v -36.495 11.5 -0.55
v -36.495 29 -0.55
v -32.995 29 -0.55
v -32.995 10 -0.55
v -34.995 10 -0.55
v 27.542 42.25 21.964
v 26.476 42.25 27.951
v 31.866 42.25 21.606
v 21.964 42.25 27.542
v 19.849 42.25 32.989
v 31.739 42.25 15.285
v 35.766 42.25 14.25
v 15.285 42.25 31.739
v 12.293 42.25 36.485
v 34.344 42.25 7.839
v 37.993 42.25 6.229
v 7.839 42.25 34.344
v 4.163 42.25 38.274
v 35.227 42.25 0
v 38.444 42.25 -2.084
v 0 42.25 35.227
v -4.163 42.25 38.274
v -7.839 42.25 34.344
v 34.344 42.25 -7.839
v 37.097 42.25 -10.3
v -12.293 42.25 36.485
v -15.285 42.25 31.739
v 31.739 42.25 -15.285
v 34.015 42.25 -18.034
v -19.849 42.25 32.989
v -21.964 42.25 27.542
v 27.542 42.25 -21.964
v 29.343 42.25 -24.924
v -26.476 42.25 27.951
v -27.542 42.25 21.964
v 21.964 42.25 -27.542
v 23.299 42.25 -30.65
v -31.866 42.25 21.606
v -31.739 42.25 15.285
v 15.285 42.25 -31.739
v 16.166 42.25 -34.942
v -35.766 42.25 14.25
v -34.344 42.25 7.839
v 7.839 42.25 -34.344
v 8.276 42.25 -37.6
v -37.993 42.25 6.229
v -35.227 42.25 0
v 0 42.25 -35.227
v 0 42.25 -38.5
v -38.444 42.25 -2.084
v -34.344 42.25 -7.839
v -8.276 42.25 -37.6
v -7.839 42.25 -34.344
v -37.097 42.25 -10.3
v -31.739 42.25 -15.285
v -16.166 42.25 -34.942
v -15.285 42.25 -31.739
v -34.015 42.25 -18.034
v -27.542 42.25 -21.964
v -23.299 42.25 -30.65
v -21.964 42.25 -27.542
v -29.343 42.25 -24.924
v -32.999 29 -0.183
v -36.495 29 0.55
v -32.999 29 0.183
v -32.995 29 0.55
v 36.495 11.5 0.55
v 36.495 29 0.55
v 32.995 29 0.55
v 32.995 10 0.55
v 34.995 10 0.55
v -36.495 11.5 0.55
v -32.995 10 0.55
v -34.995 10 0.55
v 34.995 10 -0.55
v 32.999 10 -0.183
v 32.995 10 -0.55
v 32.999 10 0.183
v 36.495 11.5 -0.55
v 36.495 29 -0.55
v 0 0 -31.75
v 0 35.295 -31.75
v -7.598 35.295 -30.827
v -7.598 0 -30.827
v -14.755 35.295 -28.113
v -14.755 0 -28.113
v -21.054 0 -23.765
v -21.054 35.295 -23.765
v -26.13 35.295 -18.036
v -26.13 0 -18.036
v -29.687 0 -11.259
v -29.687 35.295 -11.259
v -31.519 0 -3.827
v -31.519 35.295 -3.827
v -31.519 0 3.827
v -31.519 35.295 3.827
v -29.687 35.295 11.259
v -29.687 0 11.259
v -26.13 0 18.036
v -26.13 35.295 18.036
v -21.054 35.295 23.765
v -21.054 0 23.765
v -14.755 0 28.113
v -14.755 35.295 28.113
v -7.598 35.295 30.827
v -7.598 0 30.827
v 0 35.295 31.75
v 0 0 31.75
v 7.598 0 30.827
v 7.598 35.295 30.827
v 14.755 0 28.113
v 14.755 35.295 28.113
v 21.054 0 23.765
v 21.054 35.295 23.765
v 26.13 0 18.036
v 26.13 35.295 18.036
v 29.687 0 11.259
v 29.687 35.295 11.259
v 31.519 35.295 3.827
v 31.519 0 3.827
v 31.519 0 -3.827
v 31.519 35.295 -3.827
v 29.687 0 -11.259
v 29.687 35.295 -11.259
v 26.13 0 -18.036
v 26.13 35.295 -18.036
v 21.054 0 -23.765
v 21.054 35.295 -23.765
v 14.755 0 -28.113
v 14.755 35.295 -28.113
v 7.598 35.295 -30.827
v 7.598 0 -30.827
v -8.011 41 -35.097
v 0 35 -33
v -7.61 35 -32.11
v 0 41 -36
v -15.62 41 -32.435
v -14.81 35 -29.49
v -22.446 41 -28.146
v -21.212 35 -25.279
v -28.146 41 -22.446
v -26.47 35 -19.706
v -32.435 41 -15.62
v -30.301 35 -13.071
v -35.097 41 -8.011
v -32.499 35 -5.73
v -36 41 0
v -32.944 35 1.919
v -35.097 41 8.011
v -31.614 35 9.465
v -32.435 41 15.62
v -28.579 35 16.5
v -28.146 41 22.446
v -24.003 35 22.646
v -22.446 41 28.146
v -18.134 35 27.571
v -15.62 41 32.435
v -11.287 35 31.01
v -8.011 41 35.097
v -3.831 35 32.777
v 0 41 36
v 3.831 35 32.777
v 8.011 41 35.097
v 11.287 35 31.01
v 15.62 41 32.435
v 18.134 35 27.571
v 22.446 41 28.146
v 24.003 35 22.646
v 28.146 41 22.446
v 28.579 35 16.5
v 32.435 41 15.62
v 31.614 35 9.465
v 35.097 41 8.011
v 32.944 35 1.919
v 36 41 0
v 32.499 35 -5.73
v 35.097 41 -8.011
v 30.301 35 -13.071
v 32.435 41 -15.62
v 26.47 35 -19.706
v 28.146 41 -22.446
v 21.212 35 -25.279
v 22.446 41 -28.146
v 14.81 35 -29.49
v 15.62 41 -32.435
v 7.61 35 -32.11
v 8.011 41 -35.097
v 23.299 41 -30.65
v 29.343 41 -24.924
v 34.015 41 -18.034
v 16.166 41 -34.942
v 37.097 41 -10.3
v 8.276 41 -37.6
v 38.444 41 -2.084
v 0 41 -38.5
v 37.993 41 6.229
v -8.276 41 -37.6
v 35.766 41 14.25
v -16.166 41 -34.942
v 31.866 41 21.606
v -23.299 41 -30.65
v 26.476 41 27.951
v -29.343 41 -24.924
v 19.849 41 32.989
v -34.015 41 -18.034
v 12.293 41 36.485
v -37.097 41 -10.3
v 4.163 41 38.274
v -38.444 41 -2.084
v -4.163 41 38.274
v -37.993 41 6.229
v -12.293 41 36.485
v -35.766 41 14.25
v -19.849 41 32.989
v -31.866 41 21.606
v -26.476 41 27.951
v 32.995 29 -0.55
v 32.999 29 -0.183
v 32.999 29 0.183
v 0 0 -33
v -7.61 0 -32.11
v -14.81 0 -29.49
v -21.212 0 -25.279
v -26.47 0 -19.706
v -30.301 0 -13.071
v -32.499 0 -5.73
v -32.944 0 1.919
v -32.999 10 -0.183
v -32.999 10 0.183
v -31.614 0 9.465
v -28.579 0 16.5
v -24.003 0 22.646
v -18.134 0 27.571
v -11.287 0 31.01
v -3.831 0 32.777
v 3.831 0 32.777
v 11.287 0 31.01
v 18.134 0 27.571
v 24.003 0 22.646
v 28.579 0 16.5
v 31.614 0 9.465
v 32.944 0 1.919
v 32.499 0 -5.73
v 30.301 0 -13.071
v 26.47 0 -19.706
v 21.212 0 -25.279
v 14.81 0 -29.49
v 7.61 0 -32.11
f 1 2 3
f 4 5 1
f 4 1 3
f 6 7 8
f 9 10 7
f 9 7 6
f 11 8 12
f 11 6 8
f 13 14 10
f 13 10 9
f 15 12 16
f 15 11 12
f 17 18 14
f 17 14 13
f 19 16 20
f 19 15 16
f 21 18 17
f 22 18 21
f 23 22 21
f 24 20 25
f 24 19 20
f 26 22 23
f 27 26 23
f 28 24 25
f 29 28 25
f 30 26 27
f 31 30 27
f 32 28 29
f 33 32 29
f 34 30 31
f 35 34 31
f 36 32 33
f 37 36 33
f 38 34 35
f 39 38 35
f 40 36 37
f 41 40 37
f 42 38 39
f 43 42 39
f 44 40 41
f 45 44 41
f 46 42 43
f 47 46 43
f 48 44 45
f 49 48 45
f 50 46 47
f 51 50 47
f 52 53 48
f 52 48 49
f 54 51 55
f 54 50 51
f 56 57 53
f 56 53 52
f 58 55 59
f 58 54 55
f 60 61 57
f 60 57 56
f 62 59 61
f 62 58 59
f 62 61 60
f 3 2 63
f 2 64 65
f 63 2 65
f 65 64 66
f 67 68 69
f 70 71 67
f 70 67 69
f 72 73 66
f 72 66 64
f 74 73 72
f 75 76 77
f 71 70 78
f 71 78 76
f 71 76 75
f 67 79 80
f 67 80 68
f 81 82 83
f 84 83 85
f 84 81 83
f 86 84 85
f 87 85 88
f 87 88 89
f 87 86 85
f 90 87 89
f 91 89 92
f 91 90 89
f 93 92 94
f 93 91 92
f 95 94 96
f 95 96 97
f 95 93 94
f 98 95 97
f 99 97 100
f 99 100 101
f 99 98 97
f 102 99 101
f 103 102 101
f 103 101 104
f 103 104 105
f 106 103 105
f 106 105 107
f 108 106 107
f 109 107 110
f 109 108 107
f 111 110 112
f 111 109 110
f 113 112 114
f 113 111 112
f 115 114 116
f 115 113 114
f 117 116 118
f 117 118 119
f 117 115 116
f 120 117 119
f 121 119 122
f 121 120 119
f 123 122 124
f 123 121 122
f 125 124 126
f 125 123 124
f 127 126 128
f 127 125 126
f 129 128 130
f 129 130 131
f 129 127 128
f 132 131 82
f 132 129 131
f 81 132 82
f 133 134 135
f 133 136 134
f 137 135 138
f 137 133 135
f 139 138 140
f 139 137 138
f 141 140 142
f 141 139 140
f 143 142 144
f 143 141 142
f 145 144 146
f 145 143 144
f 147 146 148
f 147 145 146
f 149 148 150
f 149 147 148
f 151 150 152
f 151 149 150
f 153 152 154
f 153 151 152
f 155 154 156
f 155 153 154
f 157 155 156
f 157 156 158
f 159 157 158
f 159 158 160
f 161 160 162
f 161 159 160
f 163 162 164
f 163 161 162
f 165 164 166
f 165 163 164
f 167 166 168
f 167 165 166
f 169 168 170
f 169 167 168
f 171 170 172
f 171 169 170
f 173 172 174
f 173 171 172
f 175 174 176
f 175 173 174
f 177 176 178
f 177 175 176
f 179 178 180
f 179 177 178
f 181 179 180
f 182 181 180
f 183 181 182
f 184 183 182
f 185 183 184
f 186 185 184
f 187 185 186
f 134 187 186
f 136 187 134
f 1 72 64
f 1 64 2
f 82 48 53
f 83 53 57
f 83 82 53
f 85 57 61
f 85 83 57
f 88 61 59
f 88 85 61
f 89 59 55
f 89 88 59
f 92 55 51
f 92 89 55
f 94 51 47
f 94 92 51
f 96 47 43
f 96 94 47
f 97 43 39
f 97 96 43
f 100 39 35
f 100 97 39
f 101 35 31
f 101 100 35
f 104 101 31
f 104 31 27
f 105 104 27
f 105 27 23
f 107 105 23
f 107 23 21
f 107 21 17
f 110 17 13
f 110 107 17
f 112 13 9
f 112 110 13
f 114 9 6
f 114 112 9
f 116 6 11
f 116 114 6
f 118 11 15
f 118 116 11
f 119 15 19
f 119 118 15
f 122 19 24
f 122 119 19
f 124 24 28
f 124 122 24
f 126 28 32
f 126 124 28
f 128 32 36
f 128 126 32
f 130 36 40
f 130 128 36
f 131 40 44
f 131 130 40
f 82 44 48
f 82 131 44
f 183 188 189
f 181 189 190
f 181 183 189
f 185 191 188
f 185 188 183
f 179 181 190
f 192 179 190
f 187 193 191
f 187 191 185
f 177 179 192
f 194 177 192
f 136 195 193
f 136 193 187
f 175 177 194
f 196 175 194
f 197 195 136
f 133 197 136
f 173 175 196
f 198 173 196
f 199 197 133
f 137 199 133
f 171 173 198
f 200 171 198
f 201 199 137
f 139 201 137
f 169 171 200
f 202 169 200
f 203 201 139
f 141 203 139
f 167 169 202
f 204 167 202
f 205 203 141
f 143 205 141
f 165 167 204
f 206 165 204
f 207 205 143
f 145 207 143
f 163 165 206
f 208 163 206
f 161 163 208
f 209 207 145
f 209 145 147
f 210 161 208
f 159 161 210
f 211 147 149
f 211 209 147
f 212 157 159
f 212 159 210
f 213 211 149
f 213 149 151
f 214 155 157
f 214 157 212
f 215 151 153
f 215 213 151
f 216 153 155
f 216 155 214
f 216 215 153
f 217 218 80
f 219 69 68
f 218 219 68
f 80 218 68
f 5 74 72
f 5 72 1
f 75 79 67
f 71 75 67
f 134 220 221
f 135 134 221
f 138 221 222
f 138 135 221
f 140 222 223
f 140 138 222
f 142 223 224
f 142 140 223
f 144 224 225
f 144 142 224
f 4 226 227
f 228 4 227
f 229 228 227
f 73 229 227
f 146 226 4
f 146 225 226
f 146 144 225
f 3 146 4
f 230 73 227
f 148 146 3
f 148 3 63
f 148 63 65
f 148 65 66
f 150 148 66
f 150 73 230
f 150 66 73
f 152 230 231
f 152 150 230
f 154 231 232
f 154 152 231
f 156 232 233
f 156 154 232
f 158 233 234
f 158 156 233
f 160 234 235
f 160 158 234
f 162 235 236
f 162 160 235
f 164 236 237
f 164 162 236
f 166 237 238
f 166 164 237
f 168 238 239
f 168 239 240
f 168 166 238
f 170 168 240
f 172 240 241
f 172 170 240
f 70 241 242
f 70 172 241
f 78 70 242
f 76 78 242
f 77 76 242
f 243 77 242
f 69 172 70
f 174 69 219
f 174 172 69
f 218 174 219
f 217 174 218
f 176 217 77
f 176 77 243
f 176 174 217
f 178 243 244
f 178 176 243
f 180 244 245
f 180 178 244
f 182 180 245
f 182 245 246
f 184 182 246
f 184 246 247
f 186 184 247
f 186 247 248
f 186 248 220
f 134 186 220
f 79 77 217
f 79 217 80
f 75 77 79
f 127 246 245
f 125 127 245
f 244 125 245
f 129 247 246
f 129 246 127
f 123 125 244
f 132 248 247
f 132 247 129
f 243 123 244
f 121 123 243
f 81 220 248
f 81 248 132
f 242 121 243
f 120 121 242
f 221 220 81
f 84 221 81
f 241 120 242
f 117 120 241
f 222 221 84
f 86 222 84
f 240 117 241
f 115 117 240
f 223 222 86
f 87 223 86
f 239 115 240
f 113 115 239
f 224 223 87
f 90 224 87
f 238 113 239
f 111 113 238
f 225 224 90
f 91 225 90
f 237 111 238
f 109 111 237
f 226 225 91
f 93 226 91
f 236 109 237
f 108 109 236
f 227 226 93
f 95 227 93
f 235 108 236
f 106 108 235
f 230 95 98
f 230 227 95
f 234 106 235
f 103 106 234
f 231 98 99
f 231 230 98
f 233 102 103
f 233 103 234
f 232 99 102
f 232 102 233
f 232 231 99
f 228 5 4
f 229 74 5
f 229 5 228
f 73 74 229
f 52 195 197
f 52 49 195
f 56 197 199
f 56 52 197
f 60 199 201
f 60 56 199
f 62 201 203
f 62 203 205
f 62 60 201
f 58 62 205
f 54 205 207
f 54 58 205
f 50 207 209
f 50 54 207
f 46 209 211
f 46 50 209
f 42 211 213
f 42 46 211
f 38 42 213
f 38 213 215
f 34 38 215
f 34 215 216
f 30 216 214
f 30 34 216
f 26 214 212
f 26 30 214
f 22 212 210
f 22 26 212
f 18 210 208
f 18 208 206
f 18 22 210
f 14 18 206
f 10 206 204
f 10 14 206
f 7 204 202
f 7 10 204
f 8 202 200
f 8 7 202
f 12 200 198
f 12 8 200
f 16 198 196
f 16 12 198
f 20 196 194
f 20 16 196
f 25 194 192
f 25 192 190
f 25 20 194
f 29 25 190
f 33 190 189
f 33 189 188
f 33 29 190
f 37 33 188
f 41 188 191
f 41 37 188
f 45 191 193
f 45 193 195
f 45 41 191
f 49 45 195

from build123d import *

# Parameters (mm, degrees)
BOSS_EXTRU_1_START = -10
BOSS_EXTRU_1_DEPTH = 19
CHANFREIN1_SIZE    = 1.5


with BuildPart() as part:
    # Esquisse1 → Révolution1 (revolve)
    with BuildSketch(Plane.XY, mode=Mode.PRIVATE) as r_volution1_sk:
        Polygon((33, 0), (33, 35), (36, 41), (38.5, 41), (38.5, 42.25), (35.227457514, 42.25), (31.75, 35.295084972), (31.75, 0), align=None)
    revolve(r_volution1_sk.sketch.rotate(Axis((0, 0, 0), (0, 1, 0)), 90), axis=Axis((0, 0, 0), (0, 1, 0)))

    # Esquisse2 → Boss.-Extru.1 (add)
    with BuildSketch(Plane.XZ.offset(BOSS_EXTRU_1_START)):
        Polygon((-32.995416348, 0.55), (-36.495416348, 0.55), (-36.495416348, -0.55), (-32.995416348, -0.55), (-32.495416348, 0), align=None)
        Polygon((32.995416348, -0.55), (36.495416348, -0.55), (36.495416348, 0.55), (32.995416348, 0.55), (32.495416348, 0), align=None)
    extrude(amount=-BOSS_EXTRU_1_DEPTH)

    # Chanfrein1
    chanfrein1_edges = [part.edges().sort_by_distance(p)[0] for p in [
        (-36.495416348, 10, 0),
        (36.495416348, 10, 0),
    ]]
    chamfer(chanfrein1_edges, length=CHANFREIN1_SIZE)


solid = part.part
